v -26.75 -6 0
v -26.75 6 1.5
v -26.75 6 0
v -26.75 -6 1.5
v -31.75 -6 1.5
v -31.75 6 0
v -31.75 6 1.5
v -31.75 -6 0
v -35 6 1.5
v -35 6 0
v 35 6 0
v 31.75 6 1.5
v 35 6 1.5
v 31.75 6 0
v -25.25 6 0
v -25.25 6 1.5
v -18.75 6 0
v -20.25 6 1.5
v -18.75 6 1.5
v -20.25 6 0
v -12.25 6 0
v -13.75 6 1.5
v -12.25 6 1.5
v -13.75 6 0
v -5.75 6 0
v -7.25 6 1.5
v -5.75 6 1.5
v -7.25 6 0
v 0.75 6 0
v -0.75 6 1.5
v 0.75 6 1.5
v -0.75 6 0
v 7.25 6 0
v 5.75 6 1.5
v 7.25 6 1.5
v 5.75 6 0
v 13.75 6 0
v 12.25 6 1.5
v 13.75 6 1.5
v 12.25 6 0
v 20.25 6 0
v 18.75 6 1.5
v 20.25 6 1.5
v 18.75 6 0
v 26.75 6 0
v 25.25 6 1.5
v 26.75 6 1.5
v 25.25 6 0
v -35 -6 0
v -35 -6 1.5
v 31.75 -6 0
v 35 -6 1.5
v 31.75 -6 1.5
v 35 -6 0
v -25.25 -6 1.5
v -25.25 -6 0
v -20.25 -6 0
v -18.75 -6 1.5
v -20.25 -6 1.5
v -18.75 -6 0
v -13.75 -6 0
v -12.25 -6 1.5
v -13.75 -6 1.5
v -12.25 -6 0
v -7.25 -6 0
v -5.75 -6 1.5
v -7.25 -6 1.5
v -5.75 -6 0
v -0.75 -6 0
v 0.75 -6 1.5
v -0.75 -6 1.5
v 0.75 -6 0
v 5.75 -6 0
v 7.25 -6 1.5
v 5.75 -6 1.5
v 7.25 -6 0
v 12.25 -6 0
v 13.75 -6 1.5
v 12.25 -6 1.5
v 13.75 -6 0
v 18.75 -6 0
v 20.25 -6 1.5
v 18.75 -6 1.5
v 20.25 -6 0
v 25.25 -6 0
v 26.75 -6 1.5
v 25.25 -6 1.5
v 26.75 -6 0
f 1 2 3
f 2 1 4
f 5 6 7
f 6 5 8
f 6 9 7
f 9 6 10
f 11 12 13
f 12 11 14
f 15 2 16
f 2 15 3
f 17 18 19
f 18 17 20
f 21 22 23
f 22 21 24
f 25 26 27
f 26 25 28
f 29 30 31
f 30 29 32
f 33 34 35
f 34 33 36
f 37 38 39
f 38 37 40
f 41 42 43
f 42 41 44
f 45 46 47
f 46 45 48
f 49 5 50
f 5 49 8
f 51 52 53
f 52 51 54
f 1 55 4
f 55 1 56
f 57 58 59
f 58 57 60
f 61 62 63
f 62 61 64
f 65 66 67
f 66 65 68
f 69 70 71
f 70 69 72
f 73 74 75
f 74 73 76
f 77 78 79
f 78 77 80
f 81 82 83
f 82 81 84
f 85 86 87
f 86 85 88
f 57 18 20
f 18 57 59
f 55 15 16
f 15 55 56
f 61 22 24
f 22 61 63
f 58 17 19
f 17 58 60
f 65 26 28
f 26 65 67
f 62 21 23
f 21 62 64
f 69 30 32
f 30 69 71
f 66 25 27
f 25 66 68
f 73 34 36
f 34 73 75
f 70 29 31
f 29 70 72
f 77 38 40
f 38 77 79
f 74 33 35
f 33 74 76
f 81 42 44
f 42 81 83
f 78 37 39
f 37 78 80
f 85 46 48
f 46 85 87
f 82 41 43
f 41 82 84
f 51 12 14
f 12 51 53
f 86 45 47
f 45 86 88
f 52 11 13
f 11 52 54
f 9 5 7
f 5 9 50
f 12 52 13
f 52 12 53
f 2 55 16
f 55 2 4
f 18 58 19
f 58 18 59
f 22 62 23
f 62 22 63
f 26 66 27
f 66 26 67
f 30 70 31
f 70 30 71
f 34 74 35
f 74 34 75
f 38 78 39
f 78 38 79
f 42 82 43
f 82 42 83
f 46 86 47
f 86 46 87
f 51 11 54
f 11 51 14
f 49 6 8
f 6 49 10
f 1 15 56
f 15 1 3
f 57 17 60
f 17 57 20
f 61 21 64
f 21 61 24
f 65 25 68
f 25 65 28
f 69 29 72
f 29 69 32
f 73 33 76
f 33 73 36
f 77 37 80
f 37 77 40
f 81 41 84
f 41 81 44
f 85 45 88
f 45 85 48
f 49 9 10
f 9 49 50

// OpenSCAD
// 10-well comb for casting agarose gels
// Print orientation: flat on bed, teeth pointing down (-Z)

// ---------- Parameters ----------
plate_t      = 1.5;   // plate thickness (Z)
spine_l      = 70;    // spine length (X)
spine_w      = 12;    // spine width (Y)
teeth_n      = 10;    // number of teeth
teeth_w      = 5;     // tooth width (X)
teeth_l      = 12;    // tooth length (Y)
teeth_gap    = 1.5;   // gap between teeth (X)
overcut      = 0.5;   // cutter overshoot past faces

$fn = 64;

// ---------- Derived ----------
pitch   = teeth_w + teeth_gap;          // centre-to-centre spacing
x0      = -(teeth_n - 1) * pitch / 2;   // first tooth centre (row centred)

// ---------- Model ----------
difference() {
    // Spine
    translate([-spine_l / 2, -spine_w / 2, 0])
        cube([spine_l, spine_w, plate_t]);

    // Teeth
    for (i = [0 : teeth_n - 1])
        translate([x0 + i * pitch - teeth_w / 2,
                   -teeth_l / 2,
                   -overcut])
            cube([teeth_w, teeth_l, plate_t + 2 * overcut]);
}
